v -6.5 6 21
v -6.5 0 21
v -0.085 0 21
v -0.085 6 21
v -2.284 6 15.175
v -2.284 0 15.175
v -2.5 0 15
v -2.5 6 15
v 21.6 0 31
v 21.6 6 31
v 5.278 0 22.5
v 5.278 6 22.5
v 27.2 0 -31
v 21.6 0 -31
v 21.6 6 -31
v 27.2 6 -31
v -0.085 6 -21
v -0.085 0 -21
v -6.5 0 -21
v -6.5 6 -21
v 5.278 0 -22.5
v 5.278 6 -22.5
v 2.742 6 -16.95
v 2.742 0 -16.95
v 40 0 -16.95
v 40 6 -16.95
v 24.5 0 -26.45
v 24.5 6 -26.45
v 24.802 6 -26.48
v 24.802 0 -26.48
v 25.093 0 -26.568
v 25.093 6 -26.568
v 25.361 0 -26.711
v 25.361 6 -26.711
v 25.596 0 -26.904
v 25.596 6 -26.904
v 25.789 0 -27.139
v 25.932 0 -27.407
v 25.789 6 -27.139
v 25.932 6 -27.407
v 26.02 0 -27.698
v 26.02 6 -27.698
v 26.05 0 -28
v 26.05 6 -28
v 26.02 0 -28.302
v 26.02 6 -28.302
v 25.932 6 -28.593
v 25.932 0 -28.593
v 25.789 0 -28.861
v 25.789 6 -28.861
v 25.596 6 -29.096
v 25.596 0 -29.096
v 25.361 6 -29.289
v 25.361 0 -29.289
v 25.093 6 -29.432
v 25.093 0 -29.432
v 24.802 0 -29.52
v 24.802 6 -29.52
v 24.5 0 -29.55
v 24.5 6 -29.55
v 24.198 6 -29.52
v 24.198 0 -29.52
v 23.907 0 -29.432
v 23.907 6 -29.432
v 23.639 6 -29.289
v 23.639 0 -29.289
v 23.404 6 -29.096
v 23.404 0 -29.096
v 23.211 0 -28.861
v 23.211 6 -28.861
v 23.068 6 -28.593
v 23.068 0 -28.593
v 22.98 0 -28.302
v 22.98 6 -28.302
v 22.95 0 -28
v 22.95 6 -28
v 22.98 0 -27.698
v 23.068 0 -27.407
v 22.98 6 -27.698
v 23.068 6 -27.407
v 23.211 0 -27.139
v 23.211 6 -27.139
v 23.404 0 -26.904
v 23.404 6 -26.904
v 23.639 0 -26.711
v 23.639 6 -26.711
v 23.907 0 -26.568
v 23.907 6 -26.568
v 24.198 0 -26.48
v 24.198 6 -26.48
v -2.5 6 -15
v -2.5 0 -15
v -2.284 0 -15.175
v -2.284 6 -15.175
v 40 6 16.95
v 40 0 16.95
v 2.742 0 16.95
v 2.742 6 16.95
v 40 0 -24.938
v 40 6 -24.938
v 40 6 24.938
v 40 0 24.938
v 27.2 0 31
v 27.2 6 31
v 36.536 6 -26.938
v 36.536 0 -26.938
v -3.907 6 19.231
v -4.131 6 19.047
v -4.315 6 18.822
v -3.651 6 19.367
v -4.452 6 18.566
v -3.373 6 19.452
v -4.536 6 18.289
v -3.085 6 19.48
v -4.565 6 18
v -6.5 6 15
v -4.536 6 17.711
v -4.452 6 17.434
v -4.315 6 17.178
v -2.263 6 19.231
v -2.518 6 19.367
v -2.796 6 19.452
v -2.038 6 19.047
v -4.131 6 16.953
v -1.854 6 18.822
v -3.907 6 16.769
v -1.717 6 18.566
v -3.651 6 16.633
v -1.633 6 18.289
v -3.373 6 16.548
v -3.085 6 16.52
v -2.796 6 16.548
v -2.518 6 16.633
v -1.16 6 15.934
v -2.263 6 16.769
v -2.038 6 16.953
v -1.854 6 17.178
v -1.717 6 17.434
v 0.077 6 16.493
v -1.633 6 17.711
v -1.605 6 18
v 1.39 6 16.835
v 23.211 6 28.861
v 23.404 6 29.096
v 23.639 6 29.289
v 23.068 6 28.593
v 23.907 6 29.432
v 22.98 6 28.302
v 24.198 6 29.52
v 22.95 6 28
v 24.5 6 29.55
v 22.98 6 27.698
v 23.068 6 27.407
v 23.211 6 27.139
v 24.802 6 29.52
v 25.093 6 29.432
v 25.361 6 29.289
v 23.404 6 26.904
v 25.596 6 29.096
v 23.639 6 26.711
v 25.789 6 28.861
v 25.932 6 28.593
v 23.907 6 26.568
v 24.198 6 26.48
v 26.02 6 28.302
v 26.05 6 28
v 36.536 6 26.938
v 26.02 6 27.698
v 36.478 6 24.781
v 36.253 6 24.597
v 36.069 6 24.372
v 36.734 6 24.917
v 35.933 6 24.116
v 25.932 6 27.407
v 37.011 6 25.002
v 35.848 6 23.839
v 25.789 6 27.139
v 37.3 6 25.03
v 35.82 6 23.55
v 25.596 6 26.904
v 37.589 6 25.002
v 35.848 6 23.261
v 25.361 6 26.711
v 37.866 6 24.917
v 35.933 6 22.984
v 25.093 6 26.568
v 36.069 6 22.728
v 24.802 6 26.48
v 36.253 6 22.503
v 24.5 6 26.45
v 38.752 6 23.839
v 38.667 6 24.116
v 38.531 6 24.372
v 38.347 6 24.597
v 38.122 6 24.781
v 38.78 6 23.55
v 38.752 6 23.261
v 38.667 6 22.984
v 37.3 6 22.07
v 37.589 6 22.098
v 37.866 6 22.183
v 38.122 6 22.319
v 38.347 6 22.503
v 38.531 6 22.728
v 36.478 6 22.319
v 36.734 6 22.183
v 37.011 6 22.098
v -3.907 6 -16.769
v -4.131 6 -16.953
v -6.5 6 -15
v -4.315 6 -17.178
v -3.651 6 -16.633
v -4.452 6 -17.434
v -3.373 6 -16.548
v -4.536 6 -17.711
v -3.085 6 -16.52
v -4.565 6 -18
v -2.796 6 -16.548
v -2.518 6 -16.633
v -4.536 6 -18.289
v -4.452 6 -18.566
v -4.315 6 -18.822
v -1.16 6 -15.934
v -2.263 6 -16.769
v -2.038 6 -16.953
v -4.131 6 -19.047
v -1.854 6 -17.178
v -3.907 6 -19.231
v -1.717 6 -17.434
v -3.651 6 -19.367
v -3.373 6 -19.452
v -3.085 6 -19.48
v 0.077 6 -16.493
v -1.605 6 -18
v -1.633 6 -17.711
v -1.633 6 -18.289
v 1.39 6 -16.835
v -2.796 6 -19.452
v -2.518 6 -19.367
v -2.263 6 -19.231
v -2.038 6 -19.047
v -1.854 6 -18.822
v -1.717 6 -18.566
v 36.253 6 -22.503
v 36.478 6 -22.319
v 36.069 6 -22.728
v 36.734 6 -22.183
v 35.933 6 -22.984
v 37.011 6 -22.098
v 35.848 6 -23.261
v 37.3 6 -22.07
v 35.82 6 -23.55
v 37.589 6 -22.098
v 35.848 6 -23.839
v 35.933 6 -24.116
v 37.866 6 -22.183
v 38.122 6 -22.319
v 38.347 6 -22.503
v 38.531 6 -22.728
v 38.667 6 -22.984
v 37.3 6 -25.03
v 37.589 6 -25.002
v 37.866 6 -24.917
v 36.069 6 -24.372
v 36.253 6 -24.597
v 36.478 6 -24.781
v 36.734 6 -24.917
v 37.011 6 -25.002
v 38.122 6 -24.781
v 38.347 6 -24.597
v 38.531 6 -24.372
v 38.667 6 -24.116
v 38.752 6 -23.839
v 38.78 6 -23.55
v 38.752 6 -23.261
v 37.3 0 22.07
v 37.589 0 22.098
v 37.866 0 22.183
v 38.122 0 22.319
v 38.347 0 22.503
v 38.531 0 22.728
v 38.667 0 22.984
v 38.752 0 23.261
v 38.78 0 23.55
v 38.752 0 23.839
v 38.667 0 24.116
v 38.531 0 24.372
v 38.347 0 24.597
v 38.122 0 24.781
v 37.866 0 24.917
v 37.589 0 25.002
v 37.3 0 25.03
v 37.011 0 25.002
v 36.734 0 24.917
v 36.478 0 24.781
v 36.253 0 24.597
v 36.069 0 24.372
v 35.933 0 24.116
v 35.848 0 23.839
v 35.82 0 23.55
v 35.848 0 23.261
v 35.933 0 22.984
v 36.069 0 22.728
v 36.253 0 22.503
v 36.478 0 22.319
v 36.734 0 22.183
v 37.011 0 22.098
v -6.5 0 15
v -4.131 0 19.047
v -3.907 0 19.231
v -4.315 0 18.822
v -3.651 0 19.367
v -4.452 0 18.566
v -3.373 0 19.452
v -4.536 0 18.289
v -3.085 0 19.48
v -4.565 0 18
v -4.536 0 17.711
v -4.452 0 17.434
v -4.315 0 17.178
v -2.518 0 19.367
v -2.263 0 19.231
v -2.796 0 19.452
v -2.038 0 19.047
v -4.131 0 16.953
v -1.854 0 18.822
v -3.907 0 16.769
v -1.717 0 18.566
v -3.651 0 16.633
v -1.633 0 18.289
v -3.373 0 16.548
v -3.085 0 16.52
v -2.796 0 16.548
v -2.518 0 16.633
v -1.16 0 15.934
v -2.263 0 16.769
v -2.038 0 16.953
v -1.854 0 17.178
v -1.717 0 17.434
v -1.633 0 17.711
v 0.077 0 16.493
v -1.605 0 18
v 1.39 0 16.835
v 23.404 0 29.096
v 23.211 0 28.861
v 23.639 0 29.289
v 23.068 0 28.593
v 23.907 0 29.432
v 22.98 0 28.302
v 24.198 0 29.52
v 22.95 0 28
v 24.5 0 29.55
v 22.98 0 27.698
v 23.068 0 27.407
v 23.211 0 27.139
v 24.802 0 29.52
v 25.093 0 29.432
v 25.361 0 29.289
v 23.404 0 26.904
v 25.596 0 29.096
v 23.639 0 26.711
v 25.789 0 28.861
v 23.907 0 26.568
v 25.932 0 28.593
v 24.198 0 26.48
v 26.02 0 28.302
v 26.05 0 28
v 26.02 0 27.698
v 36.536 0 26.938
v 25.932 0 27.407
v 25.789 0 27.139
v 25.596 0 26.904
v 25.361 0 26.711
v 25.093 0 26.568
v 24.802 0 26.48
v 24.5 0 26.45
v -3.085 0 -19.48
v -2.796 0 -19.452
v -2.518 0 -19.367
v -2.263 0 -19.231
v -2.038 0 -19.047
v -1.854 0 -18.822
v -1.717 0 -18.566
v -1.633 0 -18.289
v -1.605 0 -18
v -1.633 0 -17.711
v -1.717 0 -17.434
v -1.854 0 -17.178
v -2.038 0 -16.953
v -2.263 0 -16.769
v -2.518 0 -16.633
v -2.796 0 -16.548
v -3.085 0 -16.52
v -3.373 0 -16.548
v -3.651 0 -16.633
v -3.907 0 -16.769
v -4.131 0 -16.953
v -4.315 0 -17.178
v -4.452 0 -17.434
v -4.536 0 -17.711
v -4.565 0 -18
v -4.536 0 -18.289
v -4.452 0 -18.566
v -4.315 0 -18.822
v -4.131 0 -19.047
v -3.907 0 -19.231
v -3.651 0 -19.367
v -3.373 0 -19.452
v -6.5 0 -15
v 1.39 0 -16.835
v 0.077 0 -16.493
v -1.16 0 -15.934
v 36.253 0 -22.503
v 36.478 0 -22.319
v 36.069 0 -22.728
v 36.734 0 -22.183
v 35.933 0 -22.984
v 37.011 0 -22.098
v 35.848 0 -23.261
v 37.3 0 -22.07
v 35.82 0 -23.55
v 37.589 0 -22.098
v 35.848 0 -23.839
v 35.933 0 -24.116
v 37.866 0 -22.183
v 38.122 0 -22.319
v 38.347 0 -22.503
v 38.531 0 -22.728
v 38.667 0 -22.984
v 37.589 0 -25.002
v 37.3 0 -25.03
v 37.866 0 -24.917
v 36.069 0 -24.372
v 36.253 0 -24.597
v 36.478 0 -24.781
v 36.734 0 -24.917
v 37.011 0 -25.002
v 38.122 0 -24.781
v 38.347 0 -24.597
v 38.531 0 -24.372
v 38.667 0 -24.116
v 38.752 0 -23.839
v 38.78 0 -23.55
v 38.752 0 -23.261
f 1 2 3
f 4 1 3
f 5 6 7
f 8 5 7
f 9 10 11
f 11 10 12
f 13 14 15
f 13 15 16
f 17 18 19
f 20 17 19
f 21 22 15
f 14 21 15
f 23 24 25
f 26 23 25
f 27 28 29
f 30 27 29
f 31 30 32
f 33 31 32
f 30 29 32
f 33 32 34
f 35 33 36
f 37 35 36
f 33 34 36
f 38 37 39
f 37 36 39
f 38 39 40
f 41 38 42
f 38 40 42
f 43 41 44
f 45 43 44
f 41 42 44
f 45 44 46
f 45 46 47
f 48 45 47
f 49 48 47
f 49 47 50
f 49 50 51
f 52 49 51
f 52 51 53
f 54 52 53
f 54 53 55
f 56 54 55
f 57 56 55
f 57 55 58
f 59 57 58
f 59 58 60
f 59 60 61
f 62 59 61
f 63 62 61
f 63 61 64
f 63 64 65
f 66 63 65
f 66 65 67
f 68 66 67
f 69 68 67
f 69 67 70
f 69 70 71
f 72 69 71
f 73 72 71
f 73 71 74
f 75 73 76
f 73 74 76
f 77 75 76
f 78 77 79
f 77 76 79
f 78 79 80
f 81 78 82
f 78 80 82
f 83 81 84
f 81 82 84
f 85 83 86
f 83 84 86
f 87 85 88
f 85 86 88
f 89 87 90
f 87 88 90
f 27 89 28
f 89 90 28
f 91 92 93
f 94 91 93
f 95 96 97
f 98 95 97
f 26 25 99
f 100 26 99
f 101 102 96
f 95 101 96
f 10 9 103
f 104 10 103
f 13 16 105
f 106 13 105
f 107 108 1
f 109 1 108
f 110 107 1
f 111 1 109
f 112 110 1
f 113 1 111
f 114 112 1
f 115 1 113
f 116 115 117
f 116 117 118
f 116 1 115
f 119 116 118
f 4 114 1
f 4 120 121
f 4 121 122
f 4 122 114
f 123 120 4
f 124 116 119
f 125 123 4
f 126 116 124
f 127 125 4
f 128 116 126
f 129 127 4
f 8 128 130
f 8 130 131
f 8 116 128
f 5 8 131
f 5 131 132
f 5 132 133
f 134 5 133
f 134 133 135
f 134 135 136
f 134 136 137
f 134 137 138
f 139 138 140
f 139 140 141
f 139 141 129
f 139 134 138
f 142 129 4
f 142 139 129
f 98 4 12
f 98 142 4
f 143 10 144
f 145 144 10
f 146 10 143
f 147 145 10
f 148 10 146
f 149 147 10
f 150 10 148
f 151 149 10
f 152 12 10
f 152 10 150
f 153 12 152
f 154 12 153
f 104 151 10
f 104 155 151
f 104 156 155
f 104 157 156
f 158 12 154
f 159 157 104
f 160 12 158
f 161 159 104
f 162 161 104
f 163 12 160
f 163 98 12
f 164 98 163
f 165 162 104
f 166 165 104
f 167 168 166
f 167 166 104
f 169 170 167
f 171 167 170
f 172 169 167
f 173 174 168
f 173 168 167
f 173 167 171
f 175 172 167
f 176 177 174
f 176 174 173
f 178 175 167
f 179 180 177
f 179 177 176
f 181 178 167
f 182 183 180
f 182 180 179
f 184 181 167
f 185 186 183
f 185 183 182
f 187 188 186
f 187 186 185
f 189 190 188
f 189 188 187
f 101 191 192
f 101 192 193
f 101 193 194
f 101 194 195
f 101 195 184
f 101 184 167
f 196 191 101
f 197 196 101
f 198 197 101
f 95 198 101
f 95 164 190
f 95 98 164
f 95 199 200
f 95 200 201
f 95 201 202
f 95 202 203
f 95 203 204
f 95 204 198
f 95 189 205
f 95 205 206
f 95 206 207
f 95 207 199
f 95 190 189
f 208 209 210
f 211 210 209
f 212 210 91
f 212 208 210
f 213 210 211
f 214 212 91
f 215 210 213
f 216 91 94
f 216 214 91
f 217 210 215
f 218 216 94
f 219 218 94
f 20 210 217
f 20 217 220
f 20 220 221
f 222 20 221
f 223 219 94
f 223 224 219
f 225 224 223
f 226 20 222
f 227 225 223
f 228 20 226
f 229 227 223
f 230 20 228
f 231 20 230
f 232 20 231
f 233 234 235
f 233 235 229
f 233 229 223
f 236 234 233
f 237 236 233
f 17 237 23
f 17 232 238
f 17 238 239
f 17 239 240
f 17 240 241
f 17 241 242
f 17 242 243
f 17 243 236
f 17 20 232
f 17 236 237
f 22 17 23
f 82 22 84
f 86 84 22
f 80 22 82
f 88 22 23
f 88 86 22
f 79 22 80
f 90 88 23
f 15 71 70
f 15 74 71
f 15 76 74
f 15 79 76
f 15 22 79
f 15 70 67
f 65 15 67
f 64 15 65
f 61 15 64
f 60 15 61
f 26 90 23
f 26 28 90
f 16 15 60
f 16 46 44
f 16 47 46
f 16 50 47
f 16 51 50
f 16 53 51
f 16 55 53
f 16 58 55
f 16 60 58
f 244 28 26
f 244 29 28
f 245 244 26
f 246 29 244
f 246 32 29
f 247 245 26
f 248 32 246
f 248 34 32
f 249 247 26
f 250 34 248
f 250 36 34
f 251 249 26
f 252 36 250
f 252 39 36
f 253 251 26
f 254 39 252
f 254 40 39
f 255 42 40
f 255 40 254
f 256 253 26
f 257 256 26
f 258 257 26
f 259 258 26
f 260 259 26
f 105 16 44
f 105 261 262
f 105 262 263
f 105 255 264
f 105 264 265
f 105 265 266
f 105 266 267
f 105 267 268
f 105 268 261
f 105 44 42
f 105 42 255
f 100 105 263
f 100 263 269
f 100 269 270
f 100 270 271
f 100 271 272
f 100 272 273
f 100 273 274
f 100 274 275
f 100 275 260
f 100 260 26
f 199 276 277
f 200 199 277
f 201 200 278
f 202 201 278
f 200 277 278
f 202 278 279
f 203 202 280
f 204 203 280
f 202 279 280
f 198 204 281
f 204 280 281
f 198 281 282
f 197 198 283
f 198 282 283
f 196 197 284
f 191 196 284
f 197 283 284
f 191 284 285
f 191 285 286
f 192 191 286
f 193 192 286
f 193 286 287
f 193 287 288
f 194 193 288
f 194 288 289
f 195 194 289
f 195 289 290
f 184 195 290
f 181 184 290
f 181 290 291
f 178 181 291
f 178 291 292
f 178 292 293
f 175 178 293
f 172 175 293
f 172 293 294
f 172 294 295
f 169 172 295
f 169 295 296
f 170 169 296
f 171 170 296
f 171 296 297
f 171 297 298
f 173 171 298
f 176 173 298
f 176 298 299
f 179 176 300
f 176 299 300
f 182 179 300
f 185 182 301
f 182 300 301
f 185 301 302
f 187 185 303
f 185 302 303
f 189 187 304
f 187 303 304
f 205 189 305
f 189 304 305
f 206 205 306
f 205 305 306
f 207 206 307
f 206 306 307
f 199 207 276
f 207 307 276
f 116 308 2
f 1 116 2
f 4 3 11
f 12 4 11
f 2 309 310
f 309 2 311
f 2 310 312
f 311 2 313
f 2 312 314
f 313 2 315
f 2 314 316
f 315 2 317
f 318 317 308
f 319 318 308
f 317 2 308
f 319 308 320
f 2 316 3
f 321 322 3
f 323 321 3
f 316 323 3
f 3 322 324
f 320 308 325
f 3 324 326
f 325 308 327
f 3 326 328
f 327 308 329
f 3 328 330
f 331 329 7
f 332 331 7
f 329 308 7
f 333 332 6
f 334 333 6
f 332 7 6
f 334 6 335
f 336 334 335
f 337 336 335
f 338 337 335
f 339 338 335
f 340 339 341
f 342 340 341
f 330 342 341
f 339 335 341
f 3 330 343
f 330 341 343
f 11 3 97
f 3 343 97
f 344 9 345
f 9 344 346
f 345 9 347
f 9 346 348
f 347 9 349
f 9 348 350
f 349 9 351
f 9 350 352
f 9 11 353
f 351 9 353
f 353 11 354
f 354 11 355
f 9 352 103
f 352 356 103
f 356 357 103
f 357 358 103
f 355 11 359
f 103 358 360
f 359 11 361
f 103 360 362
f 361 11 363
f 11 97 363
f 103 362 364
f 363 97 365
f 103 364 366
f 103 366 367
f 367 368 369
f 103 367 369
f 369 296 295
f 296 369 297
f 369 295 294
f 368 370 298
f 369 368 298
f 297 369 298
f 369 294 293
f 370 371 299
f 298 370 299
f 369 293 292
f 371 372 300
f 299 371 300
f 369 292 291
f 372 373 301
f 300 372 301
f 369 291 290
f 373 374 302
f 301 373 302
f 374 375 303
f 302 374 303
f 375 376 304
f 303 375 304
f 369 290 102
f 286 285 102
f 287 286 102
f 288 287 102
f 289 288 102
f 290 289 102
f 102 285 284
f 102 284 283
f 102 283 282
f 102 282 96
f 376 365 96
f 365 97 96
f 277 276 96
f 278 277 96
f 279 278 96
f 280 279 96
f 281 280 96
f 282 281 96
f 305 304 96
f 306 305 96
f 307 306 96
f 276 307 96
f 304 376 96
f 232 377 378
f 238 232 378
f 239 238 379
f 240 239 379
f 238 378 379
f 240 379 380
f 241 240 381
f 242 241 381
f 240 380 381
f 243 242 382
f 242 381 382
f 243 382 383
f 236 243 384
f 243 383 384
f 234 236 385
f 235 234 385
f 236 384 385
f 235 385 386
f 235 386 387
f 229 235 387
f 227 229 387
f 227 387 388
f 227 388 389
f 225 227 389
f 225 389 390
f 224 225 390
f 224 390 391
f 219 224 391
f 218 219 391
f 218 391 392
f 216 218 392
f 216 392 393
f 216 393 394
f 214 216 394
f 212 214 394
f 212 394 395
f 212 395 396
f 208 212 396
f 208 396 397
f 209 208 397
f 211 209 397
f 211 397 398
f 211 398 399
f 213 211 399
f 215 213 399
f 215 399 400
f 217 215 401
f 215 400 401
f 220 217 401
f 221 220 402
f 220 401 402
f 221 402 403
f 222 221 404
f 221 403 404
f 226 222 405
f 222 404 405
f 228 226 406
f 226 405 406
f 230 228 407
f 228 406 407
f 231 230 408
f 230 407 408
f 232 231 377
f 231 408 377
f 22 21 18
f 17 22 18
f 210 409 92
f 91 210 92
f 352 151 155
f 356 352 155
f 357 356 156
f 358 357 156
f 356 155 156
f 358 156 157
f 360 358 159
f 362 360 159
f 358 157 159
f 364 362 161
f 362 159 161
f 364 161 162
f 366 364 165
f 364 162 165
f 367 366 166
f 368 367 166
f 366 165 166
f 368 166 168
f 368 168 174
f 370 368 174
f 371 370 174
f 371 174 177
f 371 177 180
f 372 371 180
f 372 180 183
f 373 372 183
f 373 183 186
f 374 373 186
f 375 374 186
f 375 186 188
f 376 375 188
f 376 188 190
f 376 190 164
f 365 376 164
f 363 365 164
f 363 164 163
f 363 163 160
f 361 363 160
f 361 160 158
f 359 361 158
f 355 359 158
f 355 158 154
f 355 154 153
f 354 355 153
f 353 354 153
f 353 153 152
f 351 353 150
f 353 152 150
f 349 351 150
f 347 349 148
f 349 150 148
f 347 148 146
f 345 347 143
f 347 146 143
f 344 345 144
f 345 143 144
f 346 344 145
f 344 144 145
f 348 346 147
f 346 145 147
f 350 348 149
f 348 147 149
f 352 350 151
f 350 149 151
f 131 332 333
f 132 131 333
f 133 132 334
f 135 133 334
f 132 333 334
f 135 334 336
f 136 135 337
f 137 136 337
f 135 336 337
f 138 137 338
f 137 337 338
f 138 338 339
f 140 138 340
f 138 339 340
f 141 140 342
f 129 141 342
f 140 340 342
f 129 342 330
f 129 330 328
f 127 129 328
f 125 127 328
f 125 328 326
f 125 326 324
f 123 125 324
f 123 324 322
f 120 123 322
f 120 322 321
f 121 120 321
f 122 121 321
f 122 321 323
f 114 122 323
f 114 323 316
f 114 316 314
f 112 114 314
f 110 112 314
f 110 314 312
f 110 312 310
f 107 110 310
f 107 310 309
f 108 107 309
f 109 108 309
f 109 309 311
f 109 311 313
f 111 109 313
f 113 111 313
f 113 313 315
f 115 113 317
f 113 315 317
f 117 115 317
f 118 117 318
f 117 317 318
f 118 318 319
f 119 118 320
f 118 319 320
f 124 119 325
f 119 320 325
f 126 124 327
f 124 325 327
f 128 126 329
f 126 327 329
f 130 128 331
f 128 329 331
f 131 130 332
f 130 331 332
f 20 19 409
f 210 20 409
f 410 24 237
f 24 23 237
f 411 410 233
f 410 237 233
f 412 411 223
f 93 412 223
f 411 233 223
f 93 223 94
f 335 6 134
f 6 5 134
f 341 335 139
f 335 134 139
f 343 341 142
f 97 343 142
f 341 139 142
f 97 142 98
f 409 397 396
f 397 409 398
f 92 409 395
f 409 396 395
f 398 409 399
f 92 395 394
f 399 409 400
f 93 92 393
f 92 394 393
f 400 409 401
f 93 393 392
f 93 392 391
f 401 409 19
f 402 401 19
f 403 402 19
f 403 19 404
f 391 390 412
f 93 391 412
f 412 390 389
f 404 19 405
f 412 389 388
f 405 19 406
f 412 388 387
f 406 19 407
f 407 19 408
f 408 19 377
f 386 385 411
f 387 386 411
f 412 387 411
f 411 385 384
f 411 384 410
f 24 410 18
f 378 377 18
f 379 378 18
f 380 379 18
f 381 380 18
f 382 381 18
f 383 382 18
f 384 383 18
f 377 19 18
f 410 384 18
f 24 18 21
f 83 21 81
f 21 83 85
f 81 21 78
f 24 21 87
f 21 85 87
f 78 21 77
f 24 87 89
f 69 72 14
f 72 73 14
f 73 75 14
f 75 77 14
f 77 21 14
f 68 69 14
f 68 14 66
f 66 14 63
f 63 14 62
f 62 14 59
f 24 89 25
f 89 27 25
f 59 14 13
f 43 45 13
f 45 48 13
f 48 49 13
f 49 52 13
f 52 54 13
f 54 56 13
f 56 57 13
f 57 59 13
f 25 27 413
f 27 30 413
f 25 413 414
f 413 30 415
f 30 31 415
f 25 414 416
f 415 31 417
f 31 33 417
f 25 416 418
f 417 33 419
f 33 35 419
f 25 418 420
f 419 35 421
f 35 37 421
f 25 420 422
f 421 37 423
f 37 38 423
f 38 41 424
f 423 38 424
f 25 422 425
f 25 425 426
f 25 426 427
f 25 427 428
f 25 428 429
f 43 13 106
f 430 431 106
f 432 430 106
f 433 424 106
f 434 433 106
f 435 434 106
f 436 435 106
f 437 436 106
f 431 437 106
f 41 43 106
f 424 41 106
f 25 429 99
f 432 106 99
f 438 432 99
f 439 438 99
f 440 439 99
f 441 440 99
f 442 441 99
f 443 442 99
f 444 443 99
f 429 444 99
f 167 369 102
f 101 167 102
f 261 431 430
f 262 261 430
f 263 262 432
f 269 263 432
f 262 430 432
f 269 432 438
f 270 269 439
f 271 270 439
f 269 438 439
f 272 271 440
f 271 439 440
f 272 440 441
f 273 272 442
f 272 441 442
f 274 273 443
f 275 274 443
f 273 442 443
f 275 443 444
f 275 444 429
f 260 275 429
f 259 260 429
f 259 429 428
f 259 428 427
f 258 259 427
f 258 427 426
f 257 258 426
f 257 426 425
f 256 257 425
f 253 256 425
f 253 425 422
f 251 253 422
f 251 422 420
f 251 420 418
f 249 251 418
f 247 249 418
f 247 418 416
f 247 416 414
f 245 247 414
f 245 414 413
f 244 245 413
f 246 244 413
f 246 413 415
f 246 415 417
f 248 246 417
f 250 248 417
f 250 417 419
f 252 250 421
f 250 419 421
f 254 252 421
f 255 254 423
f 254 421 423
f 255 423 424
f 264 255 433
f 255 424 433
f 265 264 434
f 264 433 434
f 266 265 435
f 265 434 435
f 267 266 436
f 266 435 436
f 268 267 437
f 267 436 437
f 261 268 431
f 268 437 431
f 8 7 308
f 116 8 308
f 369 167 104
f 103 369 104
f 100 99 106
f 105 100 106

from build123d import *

# Parameters (mm, degrees)
SKETCH_1_W          = 80
SKETCH_1_H          = 62
EXTRUDE_1_DEPTH     = 6
CUT_EXTRUDE_1_DEPTH = 20
SKETCH_4_R          = 1.55
CUT_EXTRUDE_2_DEPTH = 20
SKETCH_5_R          = 1.55
CUT_EXTRUDE_3_DEPTH = 20
SKETCH_6_R          = 1.48
SKETCH_6_W          = 18
SKETCH_6_H          = 6
CUT_EXTRUDE_4_DEPTH = 20
SKETCH_7_R          = 1.48
SKETCH_7_W          = 18
SKETCH_7_H          = 6
CUT_EXTRUDE_5_DEPTH = 20
CUT_EXTRUDE_6_DEPTH = 20
CUT_EXTRUDE_7_DEPTH = 20
FILLET_3_R          = 8
FILLET_4_R          = 8


with BuildPart() as part:
    # 草图1 → 凸台-拉伸1 (new body)
    with BuildSketch(Plane(origin=(0, 0, 0), x_dir=(1, 0, 0), z_dir=(0, 1, 0))):
        Rectangle(SKETCH_1_W, SKETCH_1_H)
    extrude(amount=EXTRUDE_1_DEPTH)

    # 草图2 → 切除-拉伸1 (cut)
    with BuildSketch(Plane.XZ):
        Polygon((40, -16.95), (40, 16.95), (12.215250205, 16.95), (-0.084749795, 16.95), (-2.5, 15), (-24.5, 15), (-24.5, 21), (-0.084749795, 21), (5.277568136, 22.5), (20, 31), (-40, 31), (-40, -31), (20, -31), (5.277568136, -22.5), (-0.084749795, -21), (-24.5, -21), (-24.5, -15), (-2.5, -15), (-0.084749795, -16.95), (12.215250205, -16.95), align=None)
        Polygon((29.5, 31), (40, 24.937822174), (40, 31), align=None)
        Polygon((40, -31), (40, -24.937822174), (29.5, -31), align=None)
    extrude(amount=-CUT_EXTRUDE_1_DEPTH, mode=Mode.SUBTRACT)


with BuildPart() as cut_extrude_1_piece_1:
    # of the separate pieces the step leaves, piece 1, a body of its own (cut_extrude_1_pieces)
    add(part.part.solids().sort_by_distance((20, 0, -31))[0])

    # 草图4 → 切除-拉伸2 (cut)
    with BuildSketch(Plane(origin=(0, 6, 0), x_dir=(1, 0, 0), z_dir=(0, 1, 0))):
        with Locations(Location((24.5, 28, 0), (0, 0, 270))):
            Circle(SKETCH_4_R)
    extrude(amount=-CUT_EXTRUDE_2_DEPTH, mode=Mode.SUBTRACT)

    # 草图6 → 切除-拉伸4 (cut)
    with BuildSketch(Plane.XZ):
        with Locations(Location((37.3, -23.55, 0), (0, 0, 270))):
            Circle(SKETCH_6_R)
        with Locations(Location((-3.084749795, -18, 0), (0, 0, 270))):
            Circle(SKETCH_6_R)
        with Locations((-15.5, -18)):
            Rectangle(SKETCH_6_W, SKETCH_6_H)
    extrude(amount=-CUT_EXTRUDE_4_DEPTH, mode=Mode.SUBTRACT)

    # 草图8 → 切除-拉伸6 (cut)
    with BuildSketch(Plane(origin=(0, 6, 0), x_dir=(1, 0, 0), z_dir=(0, 1, 0))):
        Polygon((20, 31), (5.277568136, 22.5), (21.6, 31), align=None)
        Polygon((29.5, 31), (27.2, 31), (36.535898385, 26.937822174), align=None)
    extrude(amount=-CUT_EXTRUDE_6_DEPTH, mode=Mode.SUBTRACT)

    # 圆角3
    fillet_3_edges = [cut_extrude_1_piece_1.edges().sort_by_distance(p)[0] for p in [
        (-0.084749795, 3, -16.95),
    ]]
    fillet(fillet_3_edges, radius=FILLET_3_R)


with BuildPart() as cut_extrude_1_piece_2:
    # of the separate pieces the step leaves, piece 2, a body of its own (cut_extrude_1_pieces)
    add(part.part.solids().sort_by_distance((29.5, 0, 31))[0])

    # 草图5 → 切除-拉伸3 (cut)
    with BuildSketch(Plane(origin=(0, 6, 0), x_dir=(1, 0, 0), z_dir=(0, 1, 0))):
        with Locations(Location((24.5, -28, 0), (0, 0, 270))):
            Circle(SKETCH_5_R)
    extrude(amount=-CUT_EXTRUDE_3_DEPTH, mode=Mode.SUBTRACT)

    # 草图7 → 切除-拉伸5 (cut)
    with BuildSketch(Plane.XZ):
        with Locations(Location((37.3, 23.55, 0), (0, 0, 270))):
            Circle(SKETCH_7_R)
        with Locations(Location((-3.084749795, 18, 0), (0, 0, 270))):
            Circle(SKETCH_7_R)
        with Locations((-15.5, 18)):
            Rectangle(SKETCH_7_W, SKETCH_7_H)
    extrude(amount=-CUT_EXTRUDE_5_DEPTH, mode=Mode.SUBTRACT)

    # 草图9 → 切除-拉伸7 (cut)
    with BuildSketch(Plane(origin=(0, 6, 0), x_dir=(1, 0, 0), z_dir=(0, 1, 0))):
        Polygon((21.6, -31), (5.277568136, -22.5), (20, -31), align=None)
        Polygon((36.535898385, -26.937822174), (27.2, -31), (29.5, -31), align=None)
    extrude(amount=-CUT_EXTRUDE_7_DEPTH, mode=Mode.SUBTRACT)

    # 圆角4
    fillet_4_edges = [cut_extrude_1_piece_2.edges().sort_by_distance(p)[0] for p in [
        (-0.084749795, 3, 16.95),
    ]]
    fillet(fillet_4_edges, radius=FILLET_4_R)


solid = Compound([cut_extrude_1_piece_1.part, cut_extrude_1_piece_2.part])
